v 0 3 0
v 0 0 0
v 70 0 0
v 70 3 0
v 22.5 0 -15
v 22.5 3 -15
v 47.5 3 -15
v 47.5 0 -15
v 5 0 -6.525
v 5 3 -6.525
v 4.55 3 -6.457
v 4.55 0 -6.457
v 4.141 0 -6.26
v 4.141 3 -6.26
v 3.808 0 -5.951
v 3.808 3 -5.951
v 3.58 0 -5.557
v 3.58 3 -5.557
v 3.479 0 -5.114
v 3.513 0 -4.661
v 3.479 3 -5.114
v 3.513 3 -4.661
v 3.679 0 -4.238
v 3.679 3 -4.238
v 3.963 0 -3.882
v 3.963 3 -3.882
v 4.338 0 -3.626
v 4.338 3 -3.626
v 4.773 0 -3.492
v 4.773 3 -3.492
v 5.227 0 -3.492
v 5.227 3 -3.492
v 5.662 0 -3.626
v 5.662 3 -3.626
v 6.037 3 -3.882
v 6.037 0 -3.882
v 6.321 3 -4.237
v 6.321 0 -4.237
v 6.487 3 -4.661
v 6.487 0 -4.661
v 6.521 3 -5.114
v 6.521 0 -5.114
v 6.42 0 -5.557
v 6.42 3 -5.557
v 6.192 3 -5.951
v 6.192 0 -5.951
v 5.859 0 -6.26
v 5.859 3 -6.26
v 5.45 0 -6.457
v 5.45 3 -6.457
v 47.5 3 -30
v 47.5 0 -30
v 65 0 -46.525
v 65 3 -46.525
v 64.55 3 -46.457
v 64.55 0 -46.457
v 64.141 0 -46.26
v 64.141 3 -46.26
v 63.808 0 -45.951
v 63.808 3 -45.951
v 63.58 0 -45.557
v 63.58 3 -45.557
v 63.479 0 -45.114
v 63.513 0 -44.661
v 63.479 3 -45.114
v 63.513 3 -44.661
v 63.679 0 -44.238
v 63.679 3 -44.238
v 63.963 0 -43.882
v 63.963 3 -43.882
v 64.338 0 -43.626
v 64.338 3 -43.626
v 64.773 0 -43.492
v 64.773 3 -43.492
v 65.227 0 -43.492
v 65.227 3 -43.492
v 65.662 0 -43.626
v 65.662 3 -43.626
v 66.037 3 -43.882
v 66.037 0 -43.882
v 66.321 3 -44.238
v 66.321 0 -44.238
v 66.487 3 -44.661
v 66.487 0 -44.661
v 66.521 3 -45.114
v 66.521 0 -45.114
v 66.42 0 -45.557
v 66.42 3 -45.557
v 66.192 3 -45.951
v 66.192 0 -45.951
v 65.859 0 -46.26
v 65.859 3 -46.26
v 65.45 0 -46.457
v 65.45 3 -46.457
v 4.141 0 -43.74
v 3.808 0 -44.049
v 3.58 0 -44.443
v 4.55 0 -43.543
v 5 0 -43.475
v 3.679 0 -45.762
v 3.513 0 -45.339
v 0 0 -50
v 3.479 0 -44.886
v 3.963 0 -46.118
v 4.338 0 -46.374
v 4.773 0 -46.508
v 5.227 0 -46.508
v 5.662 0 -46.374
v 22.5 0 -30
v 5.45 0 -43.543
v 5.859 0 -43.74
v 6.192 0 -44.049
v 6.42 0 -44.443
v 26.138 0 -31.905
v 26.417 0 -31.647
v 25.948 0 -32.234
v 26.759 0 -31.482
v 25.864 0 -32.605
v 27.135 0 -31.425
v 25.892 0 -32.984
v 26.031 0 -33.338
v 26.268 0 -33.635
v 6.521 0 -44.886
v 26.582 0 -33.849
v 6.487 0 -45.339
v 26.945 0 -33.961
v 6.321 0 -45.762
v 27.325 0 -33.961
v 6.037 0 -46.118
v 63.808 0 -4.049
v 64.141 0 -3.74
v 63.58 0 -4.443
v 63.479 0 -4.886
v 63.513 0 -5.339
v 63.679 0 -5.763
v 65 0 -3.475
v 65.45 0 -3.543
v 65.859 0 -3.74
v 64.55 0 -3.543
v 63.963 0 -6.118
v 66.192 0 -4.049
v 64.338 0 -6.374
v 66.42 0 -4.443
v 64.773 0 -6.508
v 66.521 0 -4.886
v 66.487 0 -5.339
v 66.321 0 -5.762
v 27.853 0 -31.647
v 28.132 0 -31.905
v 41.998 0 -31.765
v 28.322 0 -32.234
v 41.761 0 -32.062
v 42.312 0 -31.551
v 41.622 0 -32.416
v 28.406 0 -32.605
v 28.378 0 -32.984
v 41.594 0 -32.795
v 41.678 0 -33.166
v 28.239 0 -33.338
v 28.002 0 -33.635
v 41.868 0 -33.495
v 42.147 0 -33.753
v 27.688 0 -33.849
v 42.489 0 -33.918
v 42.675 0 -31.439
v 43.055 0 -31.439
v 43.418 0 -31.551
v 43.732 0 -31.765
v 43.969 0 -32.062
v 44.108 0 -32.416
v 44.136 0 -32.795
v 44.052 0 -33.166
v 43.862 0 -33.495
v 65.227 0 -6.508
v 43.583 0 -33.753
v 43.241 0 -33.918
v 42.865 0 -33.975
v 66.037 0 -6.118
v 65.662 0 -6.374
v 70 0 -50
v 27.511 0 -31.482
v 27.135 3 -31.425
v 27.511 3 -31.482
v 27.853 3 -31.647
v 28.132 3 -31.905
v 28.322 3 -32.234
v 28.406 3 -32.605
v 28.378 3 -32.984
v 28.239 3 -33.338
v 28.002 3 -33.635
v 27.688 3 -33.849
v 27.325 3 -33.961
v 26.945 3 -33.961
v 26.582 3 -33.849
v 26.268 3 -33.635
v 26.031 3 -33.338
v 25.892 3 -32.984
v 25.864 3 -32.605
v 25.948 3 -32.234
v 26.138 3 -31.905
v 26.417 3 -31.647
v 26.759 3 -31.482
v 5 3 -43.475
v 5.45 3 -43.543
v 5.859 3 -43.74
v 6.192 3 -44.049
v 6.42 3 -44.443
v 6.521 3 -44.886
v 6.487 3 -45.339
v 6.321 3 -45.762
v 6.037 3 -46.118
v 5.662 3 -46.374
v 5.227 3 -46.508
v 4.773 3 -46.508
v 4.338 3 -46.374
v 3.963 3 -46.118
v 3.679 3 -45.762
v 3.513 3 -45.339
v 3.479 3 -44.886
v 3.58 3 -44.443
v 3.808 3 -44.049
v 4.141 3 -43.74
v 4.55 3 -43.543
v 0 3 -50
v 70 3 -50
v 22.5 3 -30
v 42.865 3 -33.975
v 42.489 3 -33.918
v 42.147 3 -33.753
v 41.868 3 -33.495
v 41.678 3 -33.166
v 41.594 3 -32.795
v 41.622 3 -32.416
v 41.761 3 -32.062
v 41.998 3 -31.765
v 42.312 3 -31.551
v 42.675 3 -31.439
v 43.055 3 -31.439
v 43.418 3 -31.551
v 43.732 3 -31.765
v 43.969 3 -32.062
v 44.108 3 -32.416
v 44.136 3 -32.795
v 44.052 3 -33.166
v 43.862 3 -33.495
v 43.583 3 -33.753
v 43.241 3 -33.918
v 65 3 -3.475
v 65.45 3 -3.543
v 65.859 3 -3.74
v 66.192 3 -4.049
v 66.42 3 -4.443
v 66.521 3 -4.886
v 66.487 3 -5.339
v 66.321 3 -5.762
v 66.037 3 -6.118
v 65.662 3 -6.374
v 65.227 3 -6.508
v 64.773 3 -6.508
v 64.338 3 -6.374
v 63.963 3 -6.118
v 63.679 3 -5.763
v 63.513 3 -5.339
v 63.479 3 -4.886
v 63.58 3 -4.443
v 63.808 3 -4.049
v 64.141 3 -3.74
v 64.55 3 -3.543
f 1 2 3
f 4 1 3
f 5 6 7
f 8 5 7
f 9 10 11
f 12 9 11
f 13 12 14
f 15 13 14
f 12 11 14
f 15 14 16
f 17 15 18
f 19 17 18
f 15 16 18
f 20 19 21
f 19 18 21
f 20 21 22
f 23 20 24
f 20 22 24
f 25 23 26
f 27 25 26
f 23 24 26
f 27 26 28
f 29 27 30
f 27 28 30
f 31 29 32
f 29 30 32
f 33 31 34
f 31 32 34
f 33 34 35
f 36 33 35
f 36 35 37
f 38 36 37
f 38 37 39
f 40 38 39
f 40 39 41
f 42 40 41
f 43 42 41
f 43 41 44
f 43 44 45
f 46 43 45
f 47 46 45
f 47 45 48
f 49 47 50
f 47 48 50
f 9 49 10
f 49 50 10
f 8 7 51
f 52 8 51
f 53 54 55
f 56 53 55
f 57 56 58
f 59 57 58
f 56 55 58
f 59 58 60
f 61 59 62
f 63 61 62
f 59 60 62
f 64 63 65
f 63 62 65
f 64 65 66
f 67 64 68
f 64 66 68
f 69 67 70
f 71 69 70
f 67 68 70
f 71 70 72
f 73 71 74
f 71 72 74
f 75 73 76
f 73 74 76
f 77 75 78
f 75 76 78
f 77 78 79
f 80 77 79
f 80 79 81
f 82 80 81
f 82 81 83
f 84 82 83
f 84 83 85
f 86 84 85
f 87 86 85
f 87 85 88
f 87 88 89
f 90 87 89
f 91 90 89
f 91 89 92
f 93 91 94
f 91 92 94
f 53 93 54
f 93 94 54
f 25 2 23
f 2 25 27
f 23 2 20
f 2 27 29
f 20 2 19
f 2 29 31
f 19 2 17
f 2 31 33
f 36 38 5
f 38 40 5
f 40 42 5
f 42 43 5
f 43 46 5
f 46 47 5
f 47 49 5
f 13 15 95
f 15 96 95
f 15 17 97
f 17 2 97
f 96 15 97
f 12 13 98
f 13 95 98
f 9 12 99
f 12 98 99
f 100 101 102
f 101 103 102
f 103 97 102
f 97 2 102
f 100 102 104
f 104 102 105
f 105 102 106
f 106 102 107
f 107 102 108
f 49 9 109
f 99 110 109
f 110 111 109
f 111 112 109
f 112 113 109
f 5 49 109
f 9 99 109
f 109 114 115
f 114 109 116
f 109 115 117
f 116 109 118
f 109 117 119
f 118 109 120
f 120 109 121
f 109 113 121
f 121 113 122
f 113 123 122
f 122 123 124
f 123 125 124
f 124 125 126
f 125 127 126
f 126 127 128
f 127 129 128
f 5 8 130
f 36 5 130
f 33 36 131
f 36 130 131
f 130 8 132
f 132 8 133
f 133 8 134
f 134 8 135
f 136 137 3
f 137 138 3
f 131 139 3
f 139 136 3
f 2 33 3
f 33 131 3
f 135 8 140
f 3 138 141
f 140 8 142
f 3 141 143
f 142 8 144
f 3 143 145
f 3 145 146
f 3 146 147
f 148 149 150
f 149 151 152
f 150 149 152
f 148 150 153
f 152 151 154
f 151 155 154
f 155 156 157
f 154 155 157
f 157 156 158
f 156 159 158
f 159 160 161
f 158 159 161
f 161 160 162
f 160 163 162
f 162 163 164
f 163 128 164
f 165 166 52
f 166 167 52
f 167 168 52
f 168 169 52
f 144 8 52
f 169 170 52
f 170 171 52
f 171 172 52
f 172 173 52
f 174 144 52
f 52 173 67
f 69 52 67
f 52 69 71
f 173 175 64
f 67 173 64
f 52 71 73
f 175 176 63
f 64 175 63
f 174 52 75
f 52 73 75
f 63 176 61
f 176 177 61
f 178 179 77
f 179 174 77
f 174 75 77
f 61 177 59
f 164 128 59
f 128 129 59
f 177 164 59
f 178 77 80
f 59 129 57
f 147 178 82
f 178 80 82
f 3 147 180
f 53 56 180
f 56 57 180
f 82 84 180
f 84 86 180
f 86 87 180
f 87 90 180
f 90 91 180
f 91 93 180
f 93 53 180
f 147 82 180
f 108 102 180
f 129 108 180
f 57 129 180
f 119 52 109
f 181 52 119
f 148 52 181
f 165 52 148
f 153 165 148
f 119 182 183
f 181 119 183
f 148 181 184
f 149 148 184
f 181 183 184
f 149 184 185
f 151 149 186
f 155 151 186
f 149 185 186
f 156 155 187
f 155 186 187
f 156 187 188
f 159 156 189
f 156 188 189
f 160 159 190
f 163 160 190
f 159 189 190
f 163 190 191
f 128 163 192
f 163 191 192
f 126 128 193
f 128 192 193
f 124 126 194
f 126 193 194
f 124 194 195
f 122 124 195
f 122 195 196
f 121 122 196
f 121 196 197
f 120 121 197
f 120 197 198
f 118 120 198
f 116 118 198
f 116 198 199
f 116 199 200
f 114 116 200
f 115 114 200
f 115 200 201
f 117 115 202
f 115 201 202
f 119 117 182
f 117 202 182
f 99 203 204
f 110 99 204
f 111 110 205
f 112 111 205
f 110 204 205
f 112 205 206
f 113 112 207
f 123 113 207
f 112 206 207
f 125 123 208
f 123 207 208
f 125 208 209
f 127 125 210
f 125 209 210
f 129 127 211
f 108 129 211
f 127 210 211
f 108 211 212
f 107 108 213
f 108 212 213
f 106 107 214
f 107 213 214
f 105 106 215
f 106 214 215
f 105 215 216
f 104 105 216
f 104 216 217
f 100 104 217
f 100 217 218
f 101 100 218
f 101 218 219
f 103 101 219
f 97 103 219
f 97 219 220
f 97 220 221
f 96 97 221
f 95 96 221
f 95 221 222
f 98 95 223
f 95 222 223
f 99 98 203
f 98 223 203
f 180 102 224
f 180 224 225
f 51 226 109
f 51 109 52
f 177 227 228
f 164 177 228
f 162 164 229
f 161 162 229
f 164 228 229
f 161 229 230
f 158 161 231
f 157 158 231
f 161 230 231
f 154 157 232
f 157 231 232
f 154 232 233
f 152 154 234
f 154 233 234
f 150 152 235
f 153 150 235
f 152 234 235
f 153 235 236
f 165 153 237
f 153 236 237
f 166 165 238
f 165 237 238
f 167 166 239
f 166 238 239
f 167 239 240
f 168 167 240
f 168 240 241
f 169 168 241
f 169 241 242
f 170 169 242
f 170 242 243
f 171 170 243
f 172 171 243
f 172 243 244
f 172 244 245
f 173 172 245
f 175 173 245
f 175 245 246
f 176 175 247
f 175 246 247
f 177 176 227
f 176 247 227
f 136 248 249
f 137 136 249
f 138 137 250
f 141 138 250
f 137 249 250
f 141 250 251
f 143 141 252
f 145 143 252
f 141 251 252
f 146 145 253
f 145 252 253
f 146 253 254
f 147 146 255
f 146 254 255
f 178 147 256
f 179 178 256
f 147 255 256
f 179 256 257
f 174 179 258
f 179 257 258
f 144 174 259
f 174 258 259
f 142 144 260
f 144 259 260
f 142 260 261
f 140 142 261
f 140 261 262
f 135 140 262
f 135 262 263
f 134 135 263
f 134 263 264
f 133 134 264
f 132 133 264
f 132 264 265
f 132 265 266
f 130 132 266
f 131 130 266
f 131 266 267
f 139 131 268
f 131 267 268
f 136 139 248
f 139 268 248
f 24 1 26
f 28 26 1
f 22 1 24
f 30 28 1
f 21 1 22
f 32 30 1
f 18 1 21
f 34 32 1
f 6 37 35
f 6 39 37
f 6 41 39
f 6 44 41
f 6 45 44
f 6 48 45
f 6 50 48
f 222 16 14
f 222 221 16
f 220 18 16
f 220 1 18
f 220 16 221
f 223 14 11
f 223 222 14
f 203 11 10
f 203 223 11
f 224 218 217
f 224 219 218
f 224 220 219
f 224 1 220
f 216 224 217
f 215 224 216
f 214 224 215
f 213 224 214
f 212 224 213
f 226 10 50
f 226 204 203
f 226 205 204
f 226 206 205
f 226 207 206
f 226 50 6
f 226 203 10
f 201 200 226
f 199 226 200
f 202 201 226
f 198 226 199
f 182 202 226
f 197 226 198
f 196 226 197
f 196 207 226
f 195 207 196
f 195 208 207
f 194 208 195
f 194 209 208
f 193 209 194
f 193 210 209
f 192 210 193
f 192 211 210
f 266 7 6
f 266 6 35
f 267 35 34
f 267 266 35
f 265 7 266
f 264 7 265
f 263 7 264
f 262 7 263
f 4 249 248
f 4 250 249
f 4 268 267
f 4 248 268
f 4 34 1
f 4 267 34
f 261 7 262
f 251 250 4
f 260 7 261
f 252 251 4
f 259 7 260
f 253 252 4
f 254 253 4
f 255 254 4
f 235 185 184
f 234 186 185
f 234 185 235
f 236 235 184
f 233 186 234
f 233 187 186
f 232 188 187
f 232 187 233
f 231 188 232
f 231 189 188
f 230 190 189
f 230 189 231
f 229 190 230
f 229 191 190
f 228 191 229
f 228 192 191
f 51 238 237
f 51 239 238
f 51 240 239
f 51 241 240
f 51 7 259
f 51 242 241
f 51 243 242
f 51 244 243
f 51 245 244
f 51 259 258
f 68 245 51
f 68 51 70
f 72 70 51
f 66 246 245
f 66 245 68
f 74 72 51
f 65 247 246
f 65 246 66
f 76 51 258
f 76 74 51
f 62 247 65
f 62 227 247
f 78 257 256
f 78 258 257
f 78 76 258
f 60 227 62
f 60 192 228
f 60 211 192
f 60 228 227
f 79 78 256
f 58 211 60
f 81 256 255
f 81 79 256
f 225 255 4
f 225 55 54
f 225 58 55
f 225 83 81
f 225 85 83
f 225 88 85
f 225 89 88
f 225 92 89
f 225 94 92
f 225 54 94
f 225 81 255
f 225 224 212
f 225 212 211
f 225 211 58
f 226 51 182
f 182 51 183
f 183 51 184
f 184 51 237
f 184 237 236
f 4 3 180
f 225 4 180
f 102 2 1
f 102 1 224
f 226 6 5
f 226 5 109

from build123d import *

# Parameters (mm, degrees)
SKETCH1_W           = 70
SKETCH1_H           = 50
BOSS_EXTRUDE1_DEPTH = 3
SKETCH2_R           = 1.275
SKETCH2_W           = 25
SKETCH2_H           = 15
CUT_EXTRUDE1_DEPTH  = 3
SKETCH3_R           = 1.525
CUT_EXTRUDE2_DEPTH  = 3


with BuildPart() as part:
    # Sketch1 → Boss-Extrude1 (new body)
    with BuildSketch(Plane(origin=(0, 0, 0), x_dir=(1, 0, 0), z_dir=(0, 1, 0))):
        with Locations((35, 25)):
            Rectangle(SKETCH1_W, SKETCH1_H)
    extrude(amount=BOSS_EXTRUDE1_DEPTH)

    # Sketch2 → Cut-Extrude1 (cut)
    with BuildSketch(Plane(origin=(0, 3, 0), x_dir=(1, 0, 0), z_dir=(0, 1, 0))):
        with Locations(Location((27.135, 32.7, 0), (0, 0, 270))):
            Circle(SKETCH2_R)
        with Locations(Location((42.865, 32.7, 0), (0, 0, 90))):
            Circle(SKETCH2_R)
        with Locations((35, 22.5)):
            Rectangle(SKETCH2_W, SKETCH2_H)
    extrude(amount=-CUT_EXTRUDE1_DEPTH, mode=Mode.SUBTRACT)

    # Sketch3 → Cut-Extrude2 (cut)
    with BuildSketch(Plane(origin=(0, 3, 0), x_dir=(1, 0, 0), z_dir=(0, 1, 0))):
        with Locations(Location((5, 45, 0), (0, 0, 270))):
            Circle(SKETCH3_R)
        with Locations(Location((65, 45, 0), (0, 0, 90))):
            Circle(SKETCH3_R)
        with Locations(Location((65, 5, 0), (0, 0, 270))):
            Circle(SKETCH3_R)
        with Locations(Location((5, 5, 0), (0, 0, 90))):
            Circle(SKETCH3_R)
    extrude(amount=-CUT_EXTRUDE2_DEPTH, mode=Mode.SUBTRACT)


solid = part.part
